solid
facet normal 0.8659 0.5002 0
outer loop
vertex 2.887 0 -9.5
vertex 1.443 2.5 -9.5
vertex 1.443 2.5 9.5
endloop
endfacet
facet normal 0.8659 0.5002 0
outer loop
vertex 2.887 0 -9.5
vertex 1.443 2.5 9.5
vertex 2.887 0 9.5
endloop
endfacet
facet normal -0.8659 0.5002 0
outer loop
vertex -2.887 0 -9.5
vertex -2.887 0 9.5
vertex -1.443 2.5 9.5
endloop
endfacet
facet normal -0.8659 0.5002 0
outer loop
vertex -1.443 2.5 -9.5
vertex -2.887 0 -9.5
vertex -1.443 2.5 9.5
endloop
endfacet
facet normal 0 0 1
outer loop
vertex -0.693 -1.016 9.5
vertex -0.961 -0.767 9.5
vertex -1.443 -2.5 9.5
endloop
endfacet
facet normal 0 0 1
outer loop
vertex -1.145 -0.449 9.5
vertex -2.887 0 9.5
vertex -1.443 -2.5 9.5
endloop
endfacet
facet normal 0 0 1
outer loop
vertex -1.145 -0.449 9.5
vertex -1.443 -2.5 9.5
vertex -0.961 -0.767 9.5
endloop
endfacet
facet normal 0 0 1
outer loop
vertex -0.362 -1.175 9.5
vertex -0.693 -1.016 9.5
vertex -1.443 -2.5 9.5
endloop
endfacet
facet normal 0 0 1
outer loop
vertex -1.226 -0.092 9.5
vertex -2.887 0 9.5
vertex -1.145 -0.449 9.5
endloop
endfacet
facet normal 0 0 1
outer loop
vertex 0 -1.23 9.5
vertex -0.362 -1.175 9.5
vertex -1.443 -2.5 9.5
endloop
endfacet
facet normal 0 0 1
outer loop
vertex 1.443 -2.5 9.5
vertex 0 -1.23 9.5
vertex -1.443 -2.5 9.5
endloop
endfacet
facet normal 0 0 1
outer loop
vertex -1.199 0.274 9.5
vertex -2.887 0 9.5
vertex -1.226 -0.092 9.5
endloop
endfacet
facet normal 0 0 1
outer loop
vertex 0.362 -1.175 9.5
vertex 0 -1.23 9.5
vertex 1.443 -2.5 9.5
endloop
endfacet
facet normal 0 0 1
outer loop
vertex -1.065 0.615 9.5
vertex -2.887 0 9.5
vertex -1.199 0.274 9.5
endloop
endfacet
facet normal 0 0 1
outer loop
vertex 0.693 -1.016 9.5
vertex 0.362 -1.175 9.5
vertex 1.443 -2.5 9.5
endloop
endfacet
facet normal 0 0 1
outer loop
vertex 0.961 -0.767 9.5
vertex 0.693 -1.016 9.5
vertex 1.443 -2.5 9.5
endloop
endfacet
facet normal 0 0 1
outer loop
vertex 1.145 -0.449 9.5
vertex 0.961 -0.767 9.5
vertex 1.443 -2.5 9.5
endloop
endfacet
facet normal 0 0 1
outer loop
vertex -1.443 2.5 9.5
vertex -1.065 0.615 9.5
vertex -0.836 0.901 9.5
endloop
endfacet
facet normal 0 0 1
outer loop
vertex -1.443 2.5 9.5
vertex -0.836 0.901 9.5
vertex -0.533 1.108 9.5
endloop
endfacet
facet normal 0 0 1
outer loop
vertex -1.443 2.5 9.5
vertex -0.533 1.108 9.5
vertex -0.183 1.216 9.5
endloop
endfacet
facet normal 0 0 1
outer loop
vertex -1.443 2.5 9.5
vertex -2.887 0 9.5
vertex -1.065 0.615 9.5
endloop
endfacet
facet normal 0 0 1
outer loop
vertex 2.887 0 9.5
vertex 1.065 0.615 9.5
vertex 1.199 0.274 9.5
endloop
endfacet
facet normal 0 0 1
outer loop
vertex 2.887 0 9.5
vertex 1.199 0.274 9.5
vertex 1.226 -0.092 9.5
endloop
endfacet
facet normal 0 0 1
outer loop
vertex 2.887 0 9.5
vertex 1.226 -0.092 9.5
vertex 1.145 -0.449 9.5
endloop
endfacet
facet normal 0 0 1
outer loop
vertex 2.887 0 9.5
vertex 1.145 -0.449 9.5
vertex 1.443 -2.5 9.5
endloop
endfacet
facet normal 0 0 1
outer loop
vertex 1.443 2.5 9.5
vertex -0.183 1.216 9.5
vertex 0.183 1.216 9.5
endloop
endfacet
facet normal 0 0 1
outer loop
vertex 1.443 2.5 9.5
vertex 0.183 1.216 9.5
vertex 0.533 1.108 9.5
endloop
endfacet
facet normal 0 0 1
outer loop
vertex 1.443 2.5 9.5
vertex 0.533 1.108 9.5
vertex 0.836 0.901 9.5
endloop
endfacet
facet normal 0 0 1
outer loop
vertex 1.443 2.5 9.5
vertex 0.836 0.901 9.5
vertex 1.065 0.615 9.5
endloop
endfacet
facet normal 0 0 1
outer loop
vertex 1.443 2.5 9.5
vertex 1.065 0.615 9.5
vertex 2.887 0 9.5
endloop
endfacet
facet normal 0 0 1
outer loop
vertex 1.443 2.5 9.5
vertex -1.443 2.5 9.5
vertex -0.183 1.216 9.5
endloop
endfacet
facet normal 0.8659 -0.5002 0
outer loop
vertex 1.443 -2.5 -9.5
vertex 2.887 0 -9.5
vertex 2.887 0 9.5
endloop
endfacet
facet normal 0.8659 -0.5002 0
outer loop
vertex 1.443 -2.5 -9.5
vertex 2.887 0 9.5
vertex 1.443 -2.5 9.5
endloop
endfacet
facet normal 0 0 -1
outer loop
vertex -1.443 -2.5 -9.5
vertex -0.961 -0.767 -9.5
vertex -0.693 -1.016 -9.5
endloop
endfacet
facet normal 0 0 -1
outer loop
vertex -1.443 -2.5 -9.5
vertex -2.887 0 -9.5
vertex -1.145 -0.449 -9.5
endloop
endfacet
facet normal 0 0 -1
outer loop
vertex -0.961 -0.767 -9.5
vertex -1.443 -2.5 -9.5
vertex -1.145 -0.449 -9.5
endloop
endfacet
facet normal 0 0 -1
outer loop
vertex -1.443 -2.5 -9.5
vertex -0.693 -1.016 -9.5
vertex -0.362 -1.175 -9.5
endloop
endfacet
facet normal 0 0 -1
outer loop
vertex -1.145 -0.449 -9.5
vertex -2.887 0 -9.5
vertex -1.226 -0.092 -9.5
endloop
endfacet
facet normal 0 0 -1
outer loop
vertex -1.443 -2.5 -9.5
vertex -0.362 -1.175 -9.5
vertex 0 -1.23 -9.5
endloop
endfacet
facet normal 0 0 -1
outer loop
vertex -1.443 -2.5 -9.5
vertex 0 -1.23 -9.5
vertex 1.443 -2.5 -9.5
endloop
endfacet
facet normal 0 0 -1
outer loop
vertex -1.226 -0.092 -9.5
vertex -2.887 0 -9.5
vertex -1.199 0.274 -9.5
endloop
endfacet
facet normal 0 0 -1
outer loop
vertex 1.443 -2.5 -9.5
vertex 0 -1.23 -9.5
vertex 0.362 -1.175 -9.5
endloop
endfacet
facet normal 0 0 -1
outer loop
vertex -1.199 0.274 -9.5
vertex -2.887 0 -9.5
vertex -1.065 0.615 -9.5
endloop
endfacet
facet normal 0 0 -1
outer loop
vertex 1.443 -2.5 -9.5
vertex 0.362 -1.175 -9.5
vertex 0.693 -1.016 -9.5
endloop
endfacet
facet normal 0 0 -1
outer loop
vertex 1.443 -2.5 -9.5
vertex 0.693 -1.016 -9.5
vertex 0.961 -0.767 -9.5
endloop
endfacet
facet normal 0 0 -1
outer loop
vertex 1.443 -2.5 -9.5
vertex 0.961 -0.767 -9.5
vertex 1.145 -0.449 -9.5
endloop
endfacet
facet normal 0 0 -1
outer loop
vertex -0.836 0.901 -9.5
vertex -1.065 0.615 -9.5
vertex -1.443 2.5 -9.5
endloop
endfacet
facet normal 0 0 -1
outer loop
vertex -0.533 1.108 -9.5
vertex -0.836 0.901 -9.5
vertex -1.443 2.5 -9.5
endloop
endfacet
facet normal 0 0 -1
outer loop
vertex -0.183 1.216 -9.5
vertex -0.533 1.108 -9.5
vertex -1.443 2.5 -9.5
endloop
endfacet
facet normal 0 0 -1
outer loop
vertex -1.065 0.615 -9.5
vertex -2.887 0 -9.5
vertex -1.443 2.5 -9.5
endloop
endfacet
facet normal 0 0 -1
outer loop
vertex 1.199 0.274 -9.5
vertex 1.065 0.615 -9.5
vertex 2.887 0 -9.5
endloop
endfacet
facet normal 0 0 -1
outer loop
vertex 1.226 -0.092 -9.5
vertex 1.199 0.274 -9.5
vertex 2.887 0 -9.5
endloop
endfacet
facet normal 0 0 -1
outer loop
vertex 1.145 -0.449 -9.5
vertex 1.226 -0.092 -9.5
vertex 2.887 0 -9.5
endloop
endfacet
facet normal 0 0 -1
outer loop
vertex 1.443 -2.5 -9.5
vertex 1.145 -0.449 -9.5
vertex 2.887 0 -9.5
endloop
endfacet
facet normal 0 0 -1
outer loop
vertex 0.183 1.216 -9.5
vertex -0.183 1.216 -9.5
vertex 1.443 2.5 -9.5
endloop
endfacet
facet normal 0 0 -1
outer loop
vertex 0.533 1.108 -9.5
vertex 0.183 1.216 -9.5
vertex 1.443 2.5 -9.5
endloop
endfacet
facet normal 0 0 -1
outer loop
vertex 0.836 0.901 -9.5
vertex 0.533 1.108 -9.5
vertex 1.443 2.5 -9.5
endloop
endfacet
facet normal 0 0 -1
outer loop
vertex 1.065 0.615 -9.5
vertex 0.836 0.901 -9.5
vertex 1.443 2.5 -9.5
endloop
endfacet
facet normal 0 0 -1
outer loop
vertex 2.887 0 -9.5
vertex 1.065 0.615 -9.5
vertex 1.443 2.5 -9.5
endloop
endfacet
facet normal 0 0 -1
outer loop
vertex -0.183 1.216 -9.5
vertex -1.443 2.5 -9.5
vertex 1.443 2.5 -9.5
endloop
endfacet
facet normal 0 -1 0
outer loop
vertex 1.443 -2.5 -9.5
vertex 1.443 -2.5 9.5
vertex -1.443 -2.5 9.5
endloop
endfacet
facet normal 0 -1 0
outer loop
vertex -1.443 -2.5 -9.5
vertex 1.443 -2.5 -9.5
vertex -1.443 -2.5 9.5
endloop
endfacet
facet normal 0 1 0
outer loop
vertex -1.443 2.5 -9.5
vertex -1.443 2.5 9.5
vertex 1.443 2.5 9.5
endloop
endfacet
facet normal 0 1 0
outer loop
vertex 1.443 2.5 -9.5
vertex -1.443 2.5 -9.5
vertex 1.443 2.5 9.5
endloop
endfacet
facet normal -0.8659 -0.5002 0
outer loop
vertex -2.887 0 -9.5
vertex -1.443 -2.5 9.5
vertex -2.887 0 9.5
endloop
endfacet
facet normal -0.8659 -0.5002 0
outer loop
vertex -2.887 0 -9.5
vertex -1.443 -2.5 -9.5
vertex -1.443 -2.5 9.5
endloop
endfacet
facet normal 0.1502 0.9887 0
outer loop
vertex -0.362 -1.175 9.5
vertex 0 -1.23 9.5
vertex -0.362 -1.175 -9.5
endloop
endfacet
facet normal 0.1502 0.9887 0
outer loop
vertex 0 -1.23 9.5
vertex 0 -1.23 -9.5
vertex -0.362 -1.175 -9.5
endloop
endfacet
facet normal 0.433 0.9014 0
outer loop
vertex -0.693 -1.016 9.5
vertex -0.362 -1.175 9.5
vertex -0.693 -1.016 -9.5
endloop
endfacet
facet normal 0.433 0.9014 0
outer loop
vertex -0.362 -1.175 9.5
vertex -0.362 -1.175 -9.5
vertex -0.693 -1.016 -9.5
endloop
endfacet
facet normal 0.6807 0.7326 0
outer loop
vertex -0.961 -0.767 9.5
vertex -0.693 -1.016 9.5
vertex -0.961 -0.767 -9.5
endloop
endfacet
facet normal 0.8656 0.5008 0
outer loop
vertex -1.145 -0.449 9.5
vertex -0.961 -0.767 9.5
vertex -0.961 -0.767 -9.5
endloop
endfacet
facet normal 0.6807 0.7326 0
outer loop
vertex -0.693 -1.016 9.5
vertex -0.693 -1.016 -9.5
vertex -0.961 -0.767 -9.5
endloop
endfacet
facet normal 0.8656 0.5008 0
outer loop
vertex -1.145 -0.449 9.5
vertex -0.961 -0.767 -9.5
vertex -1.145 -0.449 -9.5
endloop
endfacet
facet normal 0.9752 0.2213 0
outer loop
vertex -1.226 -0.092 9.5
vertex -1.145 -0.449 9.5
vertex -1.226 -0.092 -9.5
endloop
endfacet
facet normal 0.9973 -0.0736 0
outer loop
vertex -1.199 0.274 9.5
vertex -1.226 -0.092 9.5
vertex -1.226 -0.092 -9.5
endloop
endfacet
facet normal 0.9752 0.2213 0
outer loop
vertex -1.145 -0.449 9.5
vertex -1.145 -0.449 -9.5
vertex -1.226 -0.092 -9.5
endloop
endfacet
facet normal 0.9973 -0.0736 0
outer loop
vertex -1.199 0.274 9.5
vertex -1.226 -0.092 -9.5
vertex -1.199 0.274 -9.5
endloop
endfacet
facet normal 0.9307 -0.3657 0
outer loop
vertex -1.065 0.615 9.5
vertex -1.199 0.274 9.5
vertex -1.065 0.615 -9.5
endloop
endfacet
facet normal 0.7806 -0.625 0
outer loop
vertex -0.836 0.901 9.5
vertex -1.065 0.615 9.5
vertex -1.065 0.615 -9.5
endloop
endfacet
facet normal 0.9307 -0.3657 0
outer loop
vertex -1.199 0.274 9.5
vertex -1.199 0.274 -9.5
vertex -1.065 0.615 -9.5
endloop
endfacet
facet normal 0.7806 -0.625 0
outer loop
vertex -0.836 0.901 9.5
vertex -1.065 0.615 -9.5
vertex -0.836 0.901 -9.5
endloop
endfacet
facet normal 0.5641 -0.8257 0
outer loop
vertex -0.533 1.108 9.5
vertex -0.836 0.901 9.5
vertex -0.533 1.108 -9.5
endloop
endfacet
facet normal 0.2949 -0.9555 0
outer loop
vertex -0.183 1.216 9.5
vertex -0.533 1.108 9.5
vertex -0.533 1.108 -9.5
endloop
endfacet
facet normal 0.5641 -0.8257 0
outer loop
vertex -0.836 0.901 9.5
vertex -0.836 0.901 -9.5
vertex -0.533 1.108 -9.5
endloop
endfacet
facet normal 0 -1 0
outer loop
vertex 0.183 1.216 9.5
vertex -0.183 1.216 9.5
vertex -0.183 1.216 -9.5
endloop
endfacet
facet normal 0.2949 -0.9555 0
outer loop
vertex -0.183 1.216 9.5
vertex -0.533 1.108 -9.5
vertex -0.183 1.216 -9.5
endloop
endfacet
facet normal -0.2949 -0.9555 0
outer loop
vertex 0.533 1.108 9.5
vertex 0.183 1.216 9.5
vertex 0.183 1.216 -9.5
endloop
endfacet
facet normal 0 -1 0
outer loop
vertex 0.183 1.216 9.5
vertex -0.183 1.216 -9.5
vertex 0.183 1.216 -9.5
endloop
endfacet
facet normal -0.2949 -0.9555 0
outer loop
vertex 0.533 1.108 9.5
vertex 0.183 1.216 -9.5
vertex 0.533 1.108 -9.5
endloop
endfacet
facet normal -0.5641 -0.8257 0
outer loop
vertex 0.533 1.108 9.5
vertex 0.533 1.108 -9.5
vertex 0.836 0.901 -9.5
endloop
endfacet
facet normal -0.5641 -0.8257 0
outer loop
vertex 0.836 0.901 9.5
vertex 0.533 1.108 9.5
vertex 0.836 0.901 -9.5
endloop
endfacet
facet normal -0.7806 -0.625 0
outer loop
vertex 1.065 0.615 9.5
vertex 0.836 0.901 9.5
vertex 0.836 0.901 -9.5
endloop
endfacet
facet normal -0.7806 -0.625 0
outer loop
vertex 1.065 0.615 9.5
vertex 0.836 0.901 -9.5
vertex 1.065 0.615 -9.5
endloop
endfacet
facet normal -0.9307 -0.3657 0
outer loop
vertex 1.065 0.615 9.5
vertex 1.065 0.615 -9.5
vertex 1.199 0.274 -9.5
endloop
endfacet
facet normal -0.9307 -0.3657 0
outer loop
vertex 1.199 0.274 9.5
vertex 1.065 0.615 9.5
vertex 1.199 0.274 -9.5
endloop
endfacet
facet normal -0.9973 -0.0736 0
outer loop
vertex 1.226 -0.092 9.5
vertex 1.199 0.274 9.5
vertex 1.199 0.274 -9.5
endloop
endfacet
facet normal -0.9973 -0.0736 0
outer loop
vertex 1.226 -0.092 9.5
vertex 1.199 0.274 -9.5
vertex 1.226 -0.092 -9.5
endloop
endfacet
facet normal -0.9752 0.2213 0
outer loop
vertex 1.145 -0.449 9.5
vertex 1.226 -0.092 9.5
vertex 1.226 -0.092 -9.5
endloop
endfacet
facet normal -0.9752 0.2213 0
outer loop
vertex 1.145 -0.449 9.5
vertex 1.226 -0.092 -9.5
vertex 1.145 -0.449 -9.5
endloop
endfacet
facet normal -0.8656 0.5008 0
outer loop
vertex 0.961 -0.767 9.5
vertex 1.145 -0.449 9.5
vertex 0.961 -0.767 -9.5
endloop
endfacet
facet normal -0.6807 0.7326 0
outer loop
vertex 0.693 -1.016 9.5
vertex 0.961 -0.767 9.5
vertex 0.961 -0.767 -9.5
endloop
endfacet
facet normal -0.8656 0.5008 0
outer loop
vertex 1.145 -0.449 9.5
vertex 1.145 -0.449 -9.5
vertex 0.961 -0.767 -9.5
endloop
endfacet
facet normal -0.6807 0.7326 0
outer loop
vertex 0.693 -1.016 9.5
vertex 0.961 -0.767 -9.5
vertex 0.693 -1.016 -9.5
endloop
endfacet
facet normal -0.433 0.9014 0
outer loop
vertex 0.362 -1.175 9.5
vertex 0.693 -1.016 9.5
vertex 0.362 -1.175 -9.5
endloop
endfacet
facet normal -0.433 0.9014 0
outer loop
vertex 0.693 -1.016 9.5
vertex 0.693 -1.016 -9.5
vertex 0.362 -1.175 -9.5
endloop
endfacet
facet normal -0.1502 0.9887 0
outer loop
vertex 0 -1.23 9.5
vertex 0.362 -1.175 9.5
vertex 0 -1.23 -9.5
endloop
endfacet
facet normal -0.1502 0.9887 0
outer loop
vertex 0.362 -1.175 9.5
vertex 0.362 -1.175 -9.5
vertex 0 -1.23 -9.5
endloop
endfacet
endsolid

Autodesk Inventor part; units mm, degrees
ref_plane "YZ Plane" through (0, 0, 0) normal (1, 0, 0) x (0, 1, 0)
ref_plane "XZ Plane" through (0, 0, 0) normal (0, 1, 0) x (-1, 0, 0)
ref_plane "XY Plane" through (0, 0, 0) normal (0, 0, 1) x (1, 0, 0)
sketch "Skizze2" plane through (0, 0, 0) normal (0, 0, 1) x (1, 0, 0)
  line L0 (-1.4434, 2.5) -> (1.4434, 2.5)
  line L1 (1.4434, 2.5) -> (2.8868, 0)
  line L2 (2.8868, 0) -> (1.4434, -2.5)
  line L3 (1.4434, -2.5) -> (-1.4434, -2.5)
  line L4 (-1.4434, -2.5) -> (-2.8868, 0)
  line L5 (-2.8868, 0) -> (-1.4434, 2.5)
  line L6 (-1.4434, 2.5) -> (1.4434, -2.5) construction
  point P0 (0, 0)
  point P1 (0, 0)
  dimension "d17" = 120
  dimension "d19" = 120
  dimension "d22" = 120
  dimension "d36" = 5
extrude "Extrusion1" add sketch "Skizze2" along normal mid plane 19
sketch "Skizze4" plane through (0, 0, 9.5) normal (0, 0, 1) x (1, 0, 0)
  point P0 (0, 0)
hole "Bohrung1" at (0, 0, 9.5) direction (0, 0, -1) diameter 2.459 end through all thread size "M3x0.5" class "6H" standard "ISO Metric profile"
properties part number "Abstandshalter_M3"
